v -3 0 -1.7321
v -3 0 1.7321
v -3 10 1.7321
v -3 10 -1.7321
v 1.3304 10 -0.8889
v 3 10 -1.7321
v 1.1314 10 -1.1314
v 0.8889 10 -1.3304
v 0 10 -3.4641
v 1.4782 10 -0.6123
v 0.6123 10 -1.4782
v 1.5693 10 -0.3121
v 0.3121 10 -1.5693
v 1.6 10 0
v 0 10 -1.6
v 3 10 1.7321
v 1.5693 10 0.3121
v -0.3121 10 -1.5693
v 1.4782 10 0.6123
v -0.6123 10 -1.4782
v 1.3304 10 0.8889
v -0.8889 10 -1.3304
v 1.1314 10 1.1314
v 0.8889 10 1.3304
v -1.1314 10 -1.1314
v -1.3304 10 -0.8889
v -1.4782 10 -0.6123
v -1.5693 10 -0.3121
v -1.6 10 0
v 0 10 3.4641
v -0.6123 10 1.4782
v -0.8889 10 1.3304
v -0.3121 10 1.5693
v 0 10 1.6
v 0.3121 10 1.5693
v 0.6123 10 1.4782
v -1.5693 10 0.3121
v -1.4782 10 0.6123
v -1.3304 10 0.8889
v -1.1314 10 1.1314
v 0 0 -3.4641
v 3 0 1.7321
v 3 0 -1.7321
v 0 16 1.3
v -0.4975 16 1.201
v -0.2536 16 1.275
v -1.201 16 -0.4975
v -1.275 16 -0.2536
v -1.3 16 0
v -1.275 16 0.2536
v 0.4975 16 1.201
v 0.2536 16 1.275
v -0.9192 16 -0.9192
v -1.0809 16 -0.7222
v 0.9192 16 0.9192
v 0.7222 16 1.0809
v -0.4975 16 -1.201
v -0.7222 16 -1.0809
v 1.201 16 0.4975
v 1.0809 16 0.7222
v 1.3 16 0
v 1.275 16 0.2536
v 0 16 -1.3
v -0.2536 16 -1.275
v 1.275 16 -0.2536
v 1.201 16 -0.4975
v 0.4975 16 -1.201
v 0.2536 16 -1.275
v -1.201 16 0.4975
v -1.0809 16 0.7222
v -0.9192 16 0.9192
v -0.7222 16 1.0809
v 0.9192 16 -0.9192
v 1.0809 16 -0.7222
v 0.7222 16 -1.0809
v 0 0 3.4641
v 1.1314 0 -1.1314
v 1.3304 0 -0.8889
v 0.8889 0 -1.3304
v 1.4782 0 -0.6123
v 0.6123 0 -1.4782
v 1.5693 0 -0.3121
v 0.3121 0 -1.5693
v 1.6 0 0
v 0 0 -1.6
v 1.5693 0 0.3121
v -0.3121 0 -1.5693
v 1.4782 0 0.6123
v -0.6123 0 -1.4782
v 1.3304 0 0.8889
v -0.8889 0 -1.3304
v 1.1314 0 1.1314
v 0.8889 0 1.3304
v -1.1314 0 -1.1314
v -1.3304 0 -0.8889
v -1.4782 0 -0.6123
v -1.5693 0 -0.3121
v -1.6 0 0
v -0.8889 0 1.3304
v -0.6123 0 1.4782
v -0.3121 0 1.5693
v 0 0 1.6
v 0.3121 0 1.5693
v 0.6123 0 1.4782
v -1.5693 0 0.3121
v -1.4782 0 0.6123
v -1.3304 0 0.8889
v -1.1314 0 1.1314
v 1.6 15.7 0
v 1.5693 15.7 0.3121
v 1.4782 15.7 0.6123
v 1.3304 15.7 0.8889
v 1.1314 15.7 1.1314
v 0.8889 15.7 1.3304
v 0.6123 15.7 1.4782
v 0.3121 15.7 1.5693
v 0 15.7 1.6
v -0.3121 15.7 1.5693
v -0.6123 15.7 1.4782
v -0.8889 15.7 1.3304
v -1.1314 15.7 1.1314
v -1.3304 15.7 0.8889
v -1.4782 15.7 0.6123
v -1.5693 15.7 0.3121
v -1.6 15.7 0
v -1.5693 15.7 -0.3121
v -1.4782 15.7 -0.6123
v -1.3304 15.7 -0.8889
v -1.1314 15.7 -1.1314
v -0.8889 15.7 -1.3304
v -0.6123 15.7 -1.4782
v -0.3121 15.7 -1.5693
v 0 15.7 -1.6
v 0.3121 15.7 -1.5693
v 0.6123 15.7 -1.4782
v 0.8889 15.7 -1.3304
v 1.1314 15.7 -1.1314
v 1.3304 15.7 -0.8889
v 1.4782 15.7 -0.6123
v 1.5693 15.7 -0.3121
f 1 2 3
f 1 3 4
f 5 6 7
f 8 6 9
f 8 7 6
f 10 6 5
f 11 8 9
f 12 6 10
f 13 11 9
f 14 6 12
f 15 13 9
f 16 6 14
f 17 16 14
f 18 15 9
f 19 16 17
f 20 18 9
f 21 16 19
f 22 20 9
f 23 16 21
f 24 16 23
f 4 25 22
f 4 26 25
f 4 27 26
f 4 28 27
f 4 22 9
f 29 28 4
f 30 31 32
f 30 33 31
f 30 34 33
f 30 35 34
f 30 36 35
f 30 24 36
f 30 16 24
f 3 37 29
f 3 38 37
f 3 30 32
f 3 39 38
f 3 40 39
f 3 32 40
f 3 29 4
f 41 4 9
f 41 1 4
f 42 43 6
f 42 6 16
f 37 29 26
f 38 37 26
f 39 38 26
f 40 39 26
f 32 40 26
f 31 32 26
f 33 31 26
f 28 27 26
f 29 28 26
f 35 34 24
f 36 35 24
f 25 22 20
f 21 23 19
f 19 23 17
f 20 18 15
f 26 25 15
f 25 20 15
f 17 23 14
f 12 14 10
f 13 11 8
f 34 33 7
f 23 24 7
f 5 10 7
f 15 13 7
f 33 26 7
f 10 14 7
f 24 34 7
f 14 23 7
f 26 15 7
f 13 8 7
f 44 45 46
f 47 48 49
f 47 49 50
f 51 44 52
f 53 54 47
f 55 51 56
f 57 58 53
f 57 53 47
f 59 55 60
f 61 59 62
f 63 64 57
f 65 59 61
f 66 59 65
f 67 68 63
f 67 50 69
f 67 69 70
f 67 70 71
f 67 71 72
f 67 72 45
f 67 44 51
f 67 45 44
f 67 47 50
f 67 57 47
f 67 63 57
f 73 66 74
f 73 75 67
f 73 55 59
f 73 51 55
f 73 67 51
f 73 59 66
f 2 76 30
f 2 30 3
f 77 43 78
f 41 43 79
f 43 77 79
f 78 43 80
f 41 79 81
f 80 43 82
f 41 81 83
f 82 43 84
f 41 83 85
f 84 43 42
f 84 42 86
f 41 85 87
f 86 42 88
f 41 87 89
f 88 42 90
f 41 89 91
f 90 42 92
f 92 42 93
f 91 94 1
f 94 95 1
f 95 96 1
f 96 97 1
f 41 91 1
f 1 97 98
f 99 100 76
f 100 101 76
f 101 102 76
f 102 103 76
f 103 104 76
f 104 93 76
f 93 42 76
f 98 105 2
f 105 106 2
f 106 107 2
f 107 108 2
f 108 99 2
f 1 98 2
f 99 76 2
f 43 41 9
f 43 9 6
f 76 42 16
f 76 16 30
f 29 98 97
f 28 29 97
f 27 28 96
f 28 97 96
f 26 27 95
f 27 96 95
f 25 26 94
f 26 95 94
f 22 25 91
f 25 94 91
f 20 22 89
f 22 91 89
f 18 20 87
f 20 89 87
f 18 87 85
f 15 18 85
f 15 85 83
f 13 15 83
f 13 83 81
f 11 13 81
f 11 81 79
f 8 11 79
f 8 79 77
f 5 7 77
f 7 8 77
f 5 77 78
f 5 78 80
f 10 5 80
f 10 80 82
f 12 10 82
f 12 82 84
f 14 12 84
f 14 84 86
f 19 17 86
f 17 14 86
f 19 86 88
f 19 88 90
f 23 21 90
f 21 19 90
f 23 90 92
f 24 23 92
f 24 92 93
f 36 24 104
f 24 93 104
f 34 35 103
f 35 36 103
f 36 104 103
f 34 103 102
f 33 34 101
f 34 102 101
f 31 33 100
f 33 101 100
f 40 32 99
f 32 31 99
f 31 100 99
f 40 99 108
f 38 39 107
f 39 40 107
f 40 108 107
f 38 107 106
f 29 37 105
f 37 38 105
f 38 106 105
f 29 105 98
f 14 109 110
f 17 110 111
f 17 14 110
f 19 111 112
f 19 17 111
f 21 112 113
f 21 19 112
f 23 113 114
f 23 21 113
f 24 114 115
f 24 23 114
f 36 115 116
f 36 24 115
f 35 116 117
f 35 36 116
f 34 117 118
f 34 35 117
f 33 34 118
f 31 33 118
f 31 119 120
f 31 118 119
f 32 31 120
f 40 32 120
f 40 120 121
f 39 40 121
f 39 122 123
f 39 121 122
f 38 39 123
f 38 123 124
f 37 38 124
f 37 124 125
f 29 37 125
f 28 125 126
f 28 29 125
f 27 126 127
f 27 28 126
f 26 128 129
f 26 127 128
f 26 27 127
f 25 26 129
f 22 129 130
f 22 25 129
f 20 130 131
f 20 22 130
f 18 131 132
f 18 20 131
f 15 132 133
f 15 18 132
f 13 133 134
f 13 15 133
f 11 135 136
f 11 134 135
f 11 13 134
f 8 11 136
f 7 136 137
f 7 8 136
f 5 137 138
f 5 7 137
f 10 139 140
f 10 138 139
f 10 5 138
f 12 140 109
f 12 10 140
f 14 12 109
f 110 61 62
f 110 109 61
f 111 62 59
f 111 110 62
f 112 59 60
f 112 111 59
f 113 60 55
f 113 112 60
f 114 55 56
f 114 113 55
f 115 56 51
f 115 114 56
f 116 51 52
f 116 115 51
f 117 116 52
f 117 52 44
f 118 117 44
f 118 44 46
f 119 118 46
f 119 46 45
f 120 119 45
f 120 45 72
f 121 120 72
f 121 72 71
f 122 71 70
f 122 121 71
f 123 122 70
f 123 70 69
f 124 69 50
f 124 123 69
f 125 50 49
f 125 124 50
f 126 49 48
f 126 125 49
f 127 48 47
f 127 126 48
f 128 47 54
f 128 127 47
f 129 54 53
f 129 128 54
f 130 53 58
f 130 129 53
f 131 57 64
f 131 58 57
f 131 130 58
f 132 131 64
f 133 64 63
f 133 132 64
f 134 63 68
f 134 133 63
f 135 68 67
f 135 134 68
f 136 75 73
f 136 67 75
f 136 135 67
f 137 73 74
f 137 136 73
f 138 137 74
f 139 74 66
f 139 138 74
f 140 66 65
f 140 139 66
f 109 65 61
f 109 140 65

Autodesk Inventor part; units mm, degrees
ref_plane "YZ Plane" through (0, 0, 0) normal (1, 0, 0) x (0, 1, 0)
ref_plane "XZ Plane" through (0, 0, 0) normal (0, 1, 0) x (-1, 0, 0)
ref_plane "XY Plane" through (0, 0, 0) normal (0, 0, 1) x (1, 0, 0)
sketch "Sketch1" plane through (0, 0, 0) normal (0, 1, 0) x (-1, 0, 0)
  circle A0 centre (0, 0) radius 1.6
  line L0 (0, -3.4641) -> (-3, -1.7321)
  line L1 (-3, -1.7321) -> (-3, 1.7321)
  line L2 (-3, 1.7321) -> (0, 3.4641)
  line L3 (0, 3.4641) -> (3, 1.7321)
  line L4 (3, 1.7321) -> (3, -1.7321)
  line L5 (3, -1.7321) -> (0, -3.4641)
  dimension "d0" = 3.2
  dimension "d1" = 6
extrude "Extrusion1" add sketch "Sketch1" along normal blind 10
sketch "Sketch3" plane through (0, 10, 0) normal (0, 1, 0) x (1, 0, 0)
  circle A0 centre (0, 0) radius 1.6
extrude "Extrusion3" add sketch "Sketch3" along normal blind 6
thread "Thread2" size "M3.5x0.6" class "6g" standard "ANSI Metric M Profile" full length
chamfer "Chamfer2" distance 0.3 angle 45 1 edges at (-1.6, 16, 0)
thread "Thread3" size "M3.5x0.6" class "6H" standard "ANSI Metric M Profile" full length
properties part number "Standoff 10" material "Nylon 6"
